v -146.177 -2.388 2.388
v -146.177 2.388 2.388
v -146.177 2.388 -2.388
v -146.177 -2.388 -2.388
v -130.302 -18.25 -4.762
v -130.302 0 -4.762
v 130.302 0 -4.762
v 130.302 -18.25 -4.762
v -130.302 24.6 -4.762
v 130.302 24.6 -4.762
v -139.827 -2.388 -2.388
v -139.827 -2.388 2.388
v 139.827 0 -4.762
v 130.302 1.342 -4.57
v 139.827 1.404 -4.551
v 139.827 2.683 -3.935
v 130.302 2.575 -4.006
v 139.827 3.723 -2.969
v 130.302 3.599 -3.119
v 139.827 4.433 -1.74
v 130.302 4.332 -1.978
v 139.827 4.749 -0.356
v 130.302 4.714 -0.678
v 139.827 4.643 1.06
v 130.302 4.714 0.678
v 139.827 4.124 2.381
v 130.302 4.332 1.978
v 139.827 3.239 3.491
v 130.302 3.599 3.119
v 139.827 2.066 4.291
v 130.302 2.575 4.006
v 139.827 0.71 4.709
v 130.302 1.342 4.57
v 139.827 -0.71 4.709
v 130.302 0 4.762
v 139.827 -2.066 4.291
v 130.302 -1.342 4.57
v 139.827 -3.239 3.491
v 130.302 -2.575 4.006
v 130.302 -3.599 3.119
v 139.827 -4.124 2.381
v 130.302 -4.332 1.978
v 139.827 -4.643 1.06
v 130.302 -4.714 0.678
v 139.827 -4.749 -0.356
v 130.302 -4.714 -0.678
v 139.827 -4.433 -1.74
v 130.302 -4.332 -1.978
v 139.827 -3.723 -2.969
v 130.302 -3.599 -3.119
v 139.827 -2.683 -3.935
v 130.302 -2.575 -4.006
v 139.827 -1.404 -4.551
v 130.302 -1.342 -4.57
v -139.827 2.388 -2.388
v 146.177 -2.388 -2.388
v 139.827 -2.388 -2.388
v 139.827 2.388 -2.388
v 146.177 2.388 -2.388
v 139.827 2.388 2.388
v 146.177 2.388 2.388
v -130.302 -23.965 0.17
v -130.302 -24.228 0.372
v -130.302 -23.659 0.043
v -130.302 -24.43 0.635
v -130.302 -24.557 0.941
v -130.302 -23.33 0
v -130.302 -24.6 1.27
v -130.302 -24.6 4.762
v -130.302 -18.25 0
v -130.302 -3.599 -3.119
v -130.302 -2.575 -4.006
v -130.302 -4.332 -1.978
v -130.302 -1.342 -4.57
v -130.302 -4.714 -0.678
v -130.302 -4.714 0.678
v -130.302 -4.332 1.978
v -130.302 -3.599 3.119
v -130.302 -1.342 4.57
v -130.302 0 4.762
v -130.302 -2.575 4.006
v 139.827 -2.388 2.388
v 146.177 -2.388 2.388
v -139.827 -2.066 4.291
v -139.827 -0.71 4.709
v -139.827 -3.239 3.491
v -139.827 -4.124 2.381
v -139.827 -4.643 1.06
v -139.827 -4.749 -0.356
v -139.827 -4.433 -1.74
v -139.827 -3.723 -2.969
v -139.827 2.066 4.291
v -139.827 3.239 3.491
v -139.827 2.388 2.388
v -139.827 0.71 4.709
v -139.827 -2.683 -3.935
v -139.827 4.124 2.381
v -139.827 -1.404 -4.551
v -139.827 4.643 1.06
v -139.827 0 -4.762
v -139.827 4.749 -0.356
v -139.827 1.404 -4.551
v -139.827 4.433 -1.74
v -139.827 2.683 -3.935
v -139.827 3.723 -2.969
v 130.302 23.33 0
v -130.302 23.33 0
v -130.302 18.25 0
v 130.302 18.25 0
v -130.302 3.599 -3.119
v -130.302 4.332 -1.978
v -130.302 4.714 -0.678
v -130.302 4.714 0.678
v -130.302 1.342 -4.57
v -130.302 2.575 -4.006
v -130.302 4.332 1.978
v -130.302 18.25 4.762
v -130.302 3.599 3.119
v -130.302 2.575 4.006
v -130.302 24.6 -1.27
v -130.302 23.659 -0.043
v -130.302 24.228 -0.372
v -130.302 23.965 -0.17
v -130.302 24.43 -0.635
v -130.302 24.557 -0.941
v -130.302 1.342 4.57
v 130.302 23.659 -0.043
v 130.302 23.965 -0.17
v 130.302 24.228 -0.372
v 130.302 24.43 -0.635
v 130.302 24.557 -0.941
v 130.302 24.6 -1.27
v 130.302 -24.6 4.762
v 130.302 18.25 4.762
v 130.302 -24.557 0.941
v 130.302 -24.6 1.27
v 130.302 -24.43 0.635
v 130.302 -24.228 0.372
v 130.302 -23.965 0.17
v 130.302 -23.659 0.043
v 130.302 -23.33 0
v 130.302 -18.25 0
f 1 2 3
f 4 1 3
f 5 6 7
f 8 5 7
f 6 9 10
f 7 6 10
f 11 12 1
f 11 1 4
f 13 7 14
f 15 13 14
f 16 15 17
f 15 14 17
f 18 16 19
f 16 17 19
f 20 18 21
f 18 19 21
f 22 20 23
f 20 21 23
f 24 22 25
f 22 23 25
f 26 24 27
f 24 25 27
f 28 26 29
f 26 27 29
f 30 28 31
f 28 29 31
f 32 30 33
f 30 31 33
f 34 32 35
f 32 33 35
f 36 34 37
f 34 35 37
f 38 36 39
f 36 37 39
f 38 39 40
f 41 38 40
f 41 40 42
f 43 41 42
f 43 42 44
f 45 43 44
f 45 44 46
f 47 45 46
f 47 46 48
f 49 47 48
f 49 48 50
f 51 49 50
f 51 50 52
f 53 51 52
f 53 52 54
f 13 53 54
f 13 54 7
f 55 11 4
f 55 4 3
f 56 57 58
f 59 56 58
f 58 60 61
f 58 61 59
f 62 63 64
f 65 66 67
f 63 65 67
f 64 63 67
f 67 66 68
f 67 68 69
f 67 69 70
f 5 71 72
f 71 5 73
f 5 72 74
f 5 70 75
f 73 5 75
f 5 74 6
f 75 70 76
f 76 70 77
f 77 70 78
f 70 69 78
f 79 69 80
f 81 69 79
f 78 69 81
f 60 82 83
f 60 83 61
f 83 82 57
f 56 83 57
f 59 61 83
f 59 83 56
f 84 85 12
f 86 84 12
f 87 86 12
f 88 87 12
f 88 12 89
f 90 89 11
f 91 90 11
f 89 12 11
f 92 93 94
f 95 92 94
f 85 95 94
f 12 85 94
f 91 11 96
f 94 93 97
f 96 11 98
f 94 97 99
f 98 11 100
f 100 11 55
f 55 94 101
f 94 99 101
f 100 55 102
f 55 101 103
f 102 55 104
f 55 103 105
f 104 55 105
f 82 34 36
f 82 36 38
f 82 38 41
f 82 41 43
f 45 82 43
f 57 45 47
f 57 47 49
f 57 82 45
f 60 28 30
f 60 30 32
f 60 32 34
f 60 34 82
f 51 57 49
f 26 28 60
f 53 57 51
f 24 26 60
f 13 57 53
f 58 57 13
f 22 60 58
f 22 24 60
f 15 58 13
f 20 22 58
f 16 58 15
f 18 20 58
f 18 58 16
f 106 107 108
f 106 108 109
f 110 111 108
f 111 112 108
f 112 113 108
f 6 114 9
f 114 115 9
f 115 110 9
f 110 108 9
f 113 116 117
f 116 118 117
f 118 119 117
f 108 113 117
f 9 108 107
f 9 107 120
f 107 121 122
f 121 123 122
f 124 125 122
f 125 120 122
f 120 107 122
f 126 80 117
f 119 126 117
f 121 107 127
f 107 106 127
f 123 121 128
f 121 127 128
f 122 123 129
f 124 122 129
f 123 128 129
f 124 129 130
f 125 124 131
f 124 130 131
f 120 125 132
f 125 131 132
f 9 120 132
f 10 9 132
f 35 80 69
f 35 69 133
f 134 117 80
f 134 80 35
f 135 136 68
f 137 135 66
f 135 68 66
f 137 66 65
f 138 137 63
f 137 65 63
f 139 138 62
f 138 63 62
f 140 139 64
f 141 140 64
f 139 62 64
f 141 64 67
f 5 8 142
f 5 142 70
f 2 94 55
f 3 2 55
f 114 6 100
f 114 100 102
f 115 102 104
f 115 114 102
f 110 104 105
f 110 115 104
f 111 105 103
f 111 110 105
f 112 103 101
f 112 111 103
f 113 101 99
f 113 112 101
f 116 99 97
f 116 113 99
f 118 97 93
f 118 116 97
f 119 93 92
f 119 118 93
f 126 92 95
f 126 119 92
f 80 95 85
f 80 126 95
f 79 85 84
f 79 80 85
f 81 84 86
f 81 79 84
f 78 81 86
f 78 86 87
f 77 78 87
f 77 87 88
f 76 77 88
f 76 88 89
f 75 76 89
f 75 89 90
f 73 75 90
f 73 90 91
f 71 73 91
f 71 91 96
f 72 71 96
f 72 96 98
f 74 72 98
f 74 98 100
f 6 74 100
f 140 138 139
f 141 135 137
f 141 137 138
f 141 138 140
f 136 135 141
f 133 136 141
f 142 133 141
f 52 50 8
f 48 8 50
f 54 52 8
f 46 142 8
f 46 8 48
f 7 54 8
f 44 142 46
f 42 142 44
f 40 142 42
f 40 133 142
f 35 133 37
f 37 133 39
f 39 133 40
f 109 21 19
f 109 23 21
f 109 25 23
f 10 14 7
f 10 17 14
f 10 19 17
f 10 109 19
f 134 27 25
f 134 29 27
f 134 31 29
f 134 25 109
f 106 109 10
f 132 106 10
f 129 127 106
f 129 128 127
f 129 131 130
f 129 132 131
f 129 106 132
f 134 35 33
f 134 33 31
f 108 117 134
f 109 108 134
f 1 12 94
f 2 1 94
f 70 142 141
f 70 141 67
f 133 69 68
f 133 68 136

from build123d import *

# Parameters (mm, degrees)
SKETCH1_W           = 260.604
SKETCH1_H           = 49.1998
BOSS_EXTRUDE1_DEPTH = 4.7625
SKETCH2_R           = 4.7625
BOSS_EXTRUDE2_DEPTH = 9.525
SKETCH3_W           = 4.7752
SKETCH3_H           = 4.7752
BOSS_EXTRUDE3_DEPTH = 6.35
SKETCH4_W           = 260.604
SKETCH4_H           = 6.35
CUT_EXTRUDE1_DEPTH  = 4.7625
SKETCH5_W           = 260.604
SKETCH5_H           = 6.35
CUT_EXTRUDE2_DEPTH  = 4.7625
FILLET1_R           = 1.27


with BuildPart() as part:
    # Sketch1 → Boss-Extrude1 (new, symmetric)
    with BuildSketch(Plane.XY):
        Rectangle(SKETCH1_W, SKETCH1_H)
    extrude(amount=BOSS_EXTRUDE1_DEPTH, both=True)

    # Sketch2 → Boss-Extrude2 (add)
    with BuildSketch(Plane(origin=(130.302, 0, 0), x_dir=(0, 0, -1), z_dir=(1, 0, 0))):
        Circle(SKETCH2_R)
    boss_extrude2 = extrude(amount=BOSS_EXTRUDE2_DEPTH)

    # Sketch3 → Boss-Extrude3 (add)
    with BuildSketch(Plane(origin=(139.827, 0, 0), x_dir=(0, 0, -1), z_dir=(1, 0, 0))):
        Rectangle(SKETCH3_W, SKETCH3_H)
    boss_extrude3 = extrude(amount=BOSS_EXTRUDE3_DEPTH)

    # Mirror1: Boss-Extrude2, Boss-Extrude3 across plane
    add(boss_extrude2.mirror(Plane(origin=(0, 0, 0), x_dir=(0, 0, 1), z_dir=(1, 0, 0))))
    add(boss_extrude3.mirror(Plane(origin=(0, 0, 0), x_dir=(0, 0, 1), z_dir=(1, 0, 0))))

    # Sketch4 → Cut-Extrude1 (cut)
    with BuildSketch(Plane.XY.offset(4.7625)):
        with Locations((0, 21.4249)):
            Rectangle(SKETCH4_W, SKETCH4_H)
    extrude(amount=-CUT_EXTRUDE1_DEPTH, mode=Mode.SUBTRACT)

    # Sketch5 → Cut-Extrude2 (cut)
    with BuildSketch(Plane(origin=(0, 0, -4.7625), x_dir=(-1, 0, 0), z_dir=(0, 0, -1))):
        with Locations((0, -21.4249)):
            Rectangle(SKETCH5_W, SKETCH5_H)
    extrude(amount=-CUT_EXTRUDE2_DEPTH, mode=Mode.SUBTRACT)

    # Fillet1
    fillet1_edges = [part.edges().sort_by_distance(p)[0] for p in [
        (0, 24.5999, 0),
        (0, -24.5999, 0),
    ]]
    fillet(fillet1_edges, radius=FILLET1_R)


solid = part.part
